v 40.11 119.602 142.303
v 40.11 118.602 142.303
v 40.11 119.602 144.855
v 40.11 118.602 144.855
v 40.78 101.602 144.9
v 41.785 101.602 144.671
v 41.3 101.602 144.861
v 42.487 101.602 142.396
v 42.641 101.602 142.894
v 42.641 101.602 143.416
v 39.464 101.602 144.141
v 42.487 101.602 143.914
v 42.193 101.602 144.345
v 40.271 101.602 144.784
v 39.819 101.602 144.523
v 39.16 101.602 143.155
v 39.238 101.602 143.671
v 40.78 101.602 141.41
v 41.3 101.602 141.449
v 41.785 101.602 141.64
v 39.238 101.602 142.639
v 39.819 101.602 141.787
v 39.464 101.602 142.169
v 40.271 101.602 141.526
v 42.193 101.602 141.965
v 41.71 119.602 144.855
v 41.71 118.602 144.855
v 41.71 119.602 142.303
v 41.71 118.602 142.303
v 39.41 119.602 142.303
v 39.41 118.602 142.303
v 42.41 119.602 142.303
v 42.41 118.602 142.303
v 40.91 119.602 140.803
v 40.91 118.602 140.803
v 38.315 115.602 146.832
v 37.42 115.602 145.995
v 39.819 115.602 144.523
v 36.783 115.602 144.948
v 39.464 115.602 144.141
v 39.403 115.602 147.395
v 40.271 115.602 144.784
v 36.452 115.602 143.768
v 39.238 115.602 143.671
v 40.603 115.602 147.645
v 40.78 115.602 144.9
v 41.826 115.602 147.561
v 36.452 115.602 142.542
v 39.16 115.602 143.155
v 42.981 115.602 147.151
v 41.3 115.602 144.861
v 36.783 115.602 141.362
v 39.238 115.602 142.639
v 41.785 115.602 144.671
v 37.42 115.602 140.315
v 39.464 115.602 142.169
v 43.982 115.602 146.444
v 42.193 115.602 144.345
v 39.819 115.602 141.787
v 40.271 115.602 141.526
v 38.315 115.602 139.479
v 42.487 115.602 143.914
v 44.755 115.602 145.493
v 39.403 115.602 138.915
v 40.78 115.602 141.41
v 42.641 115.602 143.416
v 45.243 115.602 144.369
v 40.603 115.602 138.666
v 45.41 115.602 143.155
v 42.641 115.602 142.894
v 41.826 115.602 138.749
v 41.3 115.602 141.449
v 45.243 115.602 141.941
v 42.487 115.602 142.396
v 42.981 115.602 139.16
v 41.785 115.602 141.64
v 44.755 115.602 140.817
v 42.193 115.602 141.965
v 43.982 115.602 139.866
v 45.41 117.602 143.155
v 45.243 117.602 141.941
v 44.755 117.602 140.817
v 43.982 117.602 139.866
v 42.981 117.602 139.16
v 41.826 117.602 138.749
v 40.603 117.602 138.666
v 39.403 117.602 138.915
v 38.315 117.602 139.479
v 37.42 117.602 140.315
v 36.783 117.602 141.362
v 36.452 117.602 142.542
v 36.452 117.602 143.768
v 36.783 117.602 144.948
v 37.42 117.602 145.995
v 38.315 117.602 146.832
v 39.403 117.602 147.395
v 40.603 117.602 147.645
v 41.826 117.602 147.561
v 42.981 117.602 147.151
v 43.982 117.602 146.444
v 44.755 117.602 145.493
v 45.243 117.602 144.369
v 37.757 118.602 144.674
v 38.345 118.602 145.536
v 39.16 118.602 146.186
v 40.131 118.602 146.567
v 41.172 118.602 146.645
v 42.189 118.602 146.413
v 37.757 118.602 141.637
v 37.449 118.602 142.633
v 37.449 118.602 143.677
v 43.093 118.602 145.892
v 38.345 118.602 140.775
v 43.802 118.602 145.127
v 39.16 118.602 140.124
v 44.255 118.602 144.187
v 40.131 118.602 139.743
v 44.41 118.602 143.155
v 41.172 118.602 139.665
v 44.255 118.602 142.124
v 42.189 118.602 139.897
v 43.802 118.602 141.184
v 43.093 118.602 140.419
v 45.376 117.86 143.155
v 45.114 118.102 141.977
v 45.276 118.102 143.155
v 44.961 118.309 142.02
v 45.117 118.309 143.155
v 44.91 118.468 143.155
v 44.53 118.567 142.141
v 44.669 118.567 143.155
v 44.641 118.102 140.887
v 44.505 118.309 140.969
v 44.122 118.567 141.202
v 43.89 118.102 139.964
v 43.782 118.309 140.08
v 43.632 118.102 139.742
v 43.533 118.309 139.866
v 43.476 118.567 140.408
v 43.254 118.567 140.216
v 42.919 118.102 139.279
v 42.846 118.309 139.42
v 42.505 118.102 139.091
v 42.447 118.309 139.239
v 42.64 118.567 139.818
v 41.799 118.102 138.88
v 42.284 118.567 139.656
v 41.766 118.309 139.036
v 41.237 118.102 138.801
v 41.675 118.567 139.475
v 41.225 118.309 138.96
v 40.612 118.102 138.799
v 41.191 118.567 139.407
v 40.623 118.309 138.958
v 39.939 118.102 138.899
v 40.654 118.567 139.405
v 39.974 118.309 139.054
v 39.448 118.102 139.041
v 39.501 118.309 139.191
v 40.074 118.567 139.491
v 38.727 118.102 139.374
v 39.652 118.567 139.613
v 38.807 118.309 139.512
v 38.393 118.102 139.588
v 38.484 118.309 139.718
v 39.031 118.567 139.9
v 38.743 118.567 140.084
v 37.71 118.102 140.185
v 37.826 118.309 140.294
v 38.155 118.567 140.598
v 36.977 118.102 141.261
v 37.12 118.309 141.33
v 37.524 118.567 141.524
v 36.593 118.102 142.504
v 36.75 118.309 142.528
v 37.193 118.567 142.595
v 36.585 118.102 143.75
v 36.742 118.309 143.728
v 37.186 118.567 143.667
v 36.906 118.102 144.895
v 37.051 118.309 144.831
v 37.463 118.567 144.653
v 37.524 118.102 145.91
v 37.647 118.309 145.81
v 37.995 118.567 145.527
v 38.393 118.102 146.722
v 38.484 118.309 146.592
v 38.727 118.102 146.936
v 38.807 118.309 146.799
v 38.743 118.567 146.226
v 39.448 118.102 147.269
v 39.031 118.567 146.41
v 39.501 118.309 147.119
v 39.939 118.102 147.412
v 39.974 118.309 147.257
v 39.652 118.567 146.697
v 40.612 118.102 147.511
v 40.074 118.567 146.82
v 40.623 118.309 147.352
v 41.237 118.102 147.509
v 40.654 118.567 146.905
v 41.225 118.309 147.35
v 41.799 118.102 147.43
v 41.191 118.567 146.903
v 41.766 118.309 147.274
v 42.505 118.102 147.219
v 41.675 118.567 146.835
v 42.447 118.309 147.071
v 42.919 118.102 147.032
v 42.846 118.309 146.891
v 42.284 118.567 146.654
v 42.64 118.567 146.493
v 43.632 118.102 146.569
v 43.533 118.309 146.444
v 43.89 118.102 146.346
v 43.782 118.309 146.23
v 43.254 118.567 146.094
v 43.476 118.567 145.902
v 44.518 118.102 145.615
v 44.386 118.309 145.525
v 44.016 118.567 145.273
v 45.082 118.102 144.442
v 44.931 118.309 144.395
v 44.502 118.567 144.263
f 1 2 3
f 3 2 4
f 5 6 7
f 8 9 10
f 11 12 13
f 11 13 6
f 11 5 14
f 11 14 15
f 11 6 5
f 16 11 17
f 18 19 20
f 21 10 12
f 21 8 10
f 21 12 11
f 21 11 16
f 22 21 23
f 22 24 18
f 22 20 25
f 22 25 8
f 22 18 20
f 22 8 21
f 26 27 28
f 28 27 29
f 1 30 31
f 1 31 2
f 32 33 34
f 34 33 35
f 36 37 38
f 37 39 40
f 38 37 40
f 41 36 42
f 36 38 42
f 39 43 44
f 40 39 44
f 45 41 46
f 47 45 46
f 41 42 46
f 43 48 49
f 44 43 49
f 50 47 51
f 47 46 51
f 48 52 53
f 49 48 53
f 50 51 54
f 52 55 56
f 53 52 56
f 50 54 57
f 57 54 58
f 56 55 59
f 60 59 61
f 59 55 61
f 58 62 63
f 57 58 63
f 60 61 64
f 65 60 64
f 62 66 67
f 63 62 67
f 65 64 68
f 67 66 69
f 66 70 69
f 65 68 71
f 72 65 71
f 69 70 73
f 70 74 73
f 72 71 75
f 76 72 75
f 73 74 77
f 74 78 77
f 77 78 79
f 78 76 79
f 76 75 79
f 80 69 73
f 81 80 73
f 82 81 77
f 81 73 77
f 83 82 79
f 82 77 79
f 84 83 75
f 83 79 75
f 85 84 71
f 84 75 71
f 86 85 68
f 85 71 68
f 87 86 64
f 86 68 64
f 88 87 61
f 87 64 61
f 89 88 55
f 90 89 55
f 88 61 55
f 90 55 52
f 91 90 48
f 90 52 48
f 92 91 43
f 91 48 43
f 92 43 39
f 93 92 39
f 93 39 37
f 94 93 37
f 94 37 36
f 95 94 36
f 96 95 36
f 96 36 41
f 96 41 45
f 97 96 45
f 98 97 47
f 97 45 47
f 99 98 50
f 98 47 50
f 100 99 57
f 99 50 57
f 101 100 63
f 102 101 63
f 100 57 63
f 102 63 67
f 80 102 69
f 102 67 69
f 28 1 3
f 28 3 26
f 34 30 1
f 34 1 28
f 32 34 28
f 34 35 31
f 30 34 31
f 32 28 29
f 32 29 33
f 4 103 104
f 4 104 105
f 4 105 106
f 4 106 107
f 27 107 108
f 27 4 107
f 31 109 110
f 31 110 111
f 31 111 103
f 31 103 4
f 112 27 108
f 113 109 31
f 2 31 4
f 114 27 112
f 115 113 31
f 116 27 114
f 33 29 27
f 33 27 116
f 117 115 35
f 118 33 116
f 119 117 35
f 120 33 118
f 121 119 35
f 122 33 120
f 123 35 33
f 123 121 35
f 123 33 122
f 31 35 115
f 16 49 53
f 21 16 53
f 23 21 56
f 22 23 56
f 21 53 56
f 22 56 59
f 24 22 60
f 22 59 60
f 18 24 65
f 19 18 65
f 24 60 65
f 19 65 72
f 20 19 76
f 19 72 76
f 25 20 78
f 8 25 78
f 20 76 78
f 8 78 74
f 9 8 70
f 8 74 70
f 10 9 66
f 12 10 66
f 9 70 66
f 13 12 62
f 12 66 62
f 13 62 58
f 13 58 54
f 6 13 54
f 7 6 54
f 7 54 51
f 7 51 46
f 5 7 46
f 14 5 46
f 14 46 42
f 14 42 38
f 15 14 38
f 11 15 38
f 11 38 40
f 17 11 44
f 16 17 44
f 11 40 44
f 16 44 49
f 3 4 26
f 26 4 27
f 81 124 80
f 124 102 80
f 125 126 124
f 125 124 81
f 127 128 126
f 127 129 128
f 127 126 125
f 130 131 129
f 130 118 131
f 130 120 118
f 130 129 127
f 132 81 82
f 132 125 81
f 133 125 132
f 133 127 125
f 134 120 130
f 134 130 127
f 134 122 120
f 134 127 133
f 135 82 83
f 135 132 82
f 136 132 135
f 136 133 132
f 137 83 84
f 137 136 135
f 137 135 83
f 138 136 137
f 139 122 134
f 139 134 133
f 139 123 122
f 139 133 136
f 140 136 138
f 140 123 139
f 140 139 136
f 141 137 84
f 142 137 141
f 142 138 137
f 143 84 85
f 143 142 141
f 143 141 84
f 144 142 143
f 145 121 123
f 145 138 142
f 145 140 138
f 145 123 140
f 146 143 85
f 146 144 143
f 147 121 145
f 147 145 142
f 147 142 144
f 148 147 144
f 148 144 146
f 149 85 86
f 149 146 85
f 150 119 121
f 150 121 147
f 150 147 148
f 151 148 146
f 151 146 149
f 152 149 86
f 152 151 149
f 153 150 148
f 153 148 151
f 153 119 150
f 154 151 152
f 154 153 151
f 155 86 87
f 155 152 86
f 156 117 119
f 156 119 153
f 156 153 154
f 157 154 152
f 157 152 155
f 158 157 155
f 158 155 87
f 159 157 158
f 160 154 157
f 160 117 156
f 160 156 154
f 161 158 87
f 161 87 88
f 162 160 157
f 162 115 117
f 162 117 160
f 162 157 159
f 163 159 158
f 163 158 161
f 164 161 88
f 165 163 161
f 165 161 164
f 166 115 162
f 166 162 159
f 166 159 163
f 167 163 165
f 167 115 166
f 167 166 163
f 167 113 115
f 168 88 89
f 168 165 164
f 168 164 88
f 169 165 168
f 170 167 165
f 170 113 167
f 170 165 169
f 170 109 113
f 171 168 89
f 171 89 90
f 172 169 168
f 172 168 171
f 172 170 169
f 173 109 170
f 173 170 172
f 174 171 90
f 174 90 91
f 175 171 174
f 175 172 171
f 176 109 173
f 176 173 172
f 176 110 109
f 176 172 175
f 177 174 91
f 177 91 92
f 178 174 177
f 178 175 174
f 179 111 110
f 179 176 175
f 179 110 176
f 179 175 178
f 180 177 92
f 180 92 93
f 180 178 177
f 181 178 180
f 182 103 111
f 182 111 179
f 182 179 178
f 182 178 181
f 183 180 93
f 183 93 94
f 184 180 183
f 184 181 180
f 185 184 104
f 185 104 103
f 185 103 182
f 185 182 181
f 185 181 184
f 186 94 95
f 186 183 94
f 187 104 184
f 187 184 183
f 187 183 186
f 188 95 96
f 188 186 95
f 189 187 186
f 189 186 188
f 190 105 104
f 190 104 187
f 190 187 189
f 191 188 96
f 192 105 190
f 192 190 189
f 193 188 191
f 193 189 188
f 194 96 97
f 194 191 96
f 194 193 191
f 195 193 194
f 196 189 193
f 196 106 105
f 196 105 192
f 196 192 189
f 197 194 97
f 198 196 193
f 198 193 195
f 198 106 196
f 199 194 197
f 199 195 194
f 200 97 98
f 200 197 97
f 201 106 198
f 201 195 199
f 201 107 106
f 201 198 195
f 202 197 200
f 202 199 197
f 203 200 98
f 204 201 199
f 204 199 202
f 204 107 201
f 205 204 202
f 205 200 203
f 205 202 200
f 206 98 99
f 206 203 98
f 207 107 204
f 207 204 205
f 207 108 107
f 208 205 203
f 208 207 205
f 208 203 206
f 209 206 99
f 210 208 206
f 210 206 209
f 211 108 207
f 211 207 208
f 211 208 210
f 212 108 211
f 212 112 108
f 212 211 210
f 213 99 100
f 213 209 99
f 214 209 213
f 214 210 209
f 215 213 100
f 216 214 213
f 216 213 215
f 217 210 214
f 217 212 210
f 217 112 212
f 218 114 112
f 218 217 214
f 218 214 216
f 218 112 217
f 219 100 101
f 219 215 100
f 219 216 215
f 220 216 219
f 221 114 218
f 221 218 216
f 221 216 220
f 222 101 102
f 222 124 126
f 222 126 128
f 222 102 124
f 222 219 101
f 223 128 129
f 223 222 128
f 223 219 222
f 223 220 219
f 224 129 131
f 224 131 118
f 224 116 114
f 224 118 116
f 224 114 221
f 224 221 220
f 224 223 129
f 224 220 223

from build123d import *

# Parameters (mm, degrees)
SKETCH1_R           = 4.5
BOSS_EXTRUDE1_DEPTH = 3
FILLET1_R           = 1
BOSS_EXTRUDE2_DEPTH = 1
SKETCH6_R           = 1.75
BOSS_EXTRUDE3_DEPTH = 14


with BuildPart() as part:
    # Sketch1 → Boss-Extrude1 (new body)
    with BuildSketch(Plane(origin=(0, 115.601531763, -5.053e-06), x_dir=(1, 0, 0), z_dir=(0, 1, -4.4e-08))):
        with Locations((40.91030477, -143.155151275)):
            Circle(SKETCH1_R)
    extrude(amount=BOSS_EXTRUDE1_DEPTH)

    # Fillet1
    fillet1_edges = [part.edges().sort_by_distance(p)[0] for p in [
        (36.41030477, 118.601538021, 143.155146091),
    ]]
    fillet(fillet1_edges, radius=FILLET1_R)

    # Sketch2 → Boss-Extrude2 (add)
    with BuildSketch(Plane(origin=(0, 118.601531763, -5.184e-06), x_dir=(1, 0, 0), z_dir=(0, 1, -4.4e-08))):
        Polygon((40.11030477, -142.303288868), (40.11030477, -144.855151275), (41.71030477, -144.855151275), (41.71030477, -142.303288868), (42.41030477, -142.303288868), (40.91030477, -140.803288868), (39.41030477, -142.303288868), align=None)
    extrude(amount=BOSS_EXTRUDE2_DEPTH)

    # Sketch6 → Boss-Extrude3 (add)
    with BuildSketch(Plane(origin=(0, 115.601531763, -5.053e-06), x_dir=(-1, 0, 0), z_dir=(0, -1, 4.4e-08))):
        with Locations((-40.91030477, -143.155151275)):
            Circle(SKETCH6_R)
    extrude(amount=BOSS_EXTRUDE3_DEPTH)


solid = part.part
